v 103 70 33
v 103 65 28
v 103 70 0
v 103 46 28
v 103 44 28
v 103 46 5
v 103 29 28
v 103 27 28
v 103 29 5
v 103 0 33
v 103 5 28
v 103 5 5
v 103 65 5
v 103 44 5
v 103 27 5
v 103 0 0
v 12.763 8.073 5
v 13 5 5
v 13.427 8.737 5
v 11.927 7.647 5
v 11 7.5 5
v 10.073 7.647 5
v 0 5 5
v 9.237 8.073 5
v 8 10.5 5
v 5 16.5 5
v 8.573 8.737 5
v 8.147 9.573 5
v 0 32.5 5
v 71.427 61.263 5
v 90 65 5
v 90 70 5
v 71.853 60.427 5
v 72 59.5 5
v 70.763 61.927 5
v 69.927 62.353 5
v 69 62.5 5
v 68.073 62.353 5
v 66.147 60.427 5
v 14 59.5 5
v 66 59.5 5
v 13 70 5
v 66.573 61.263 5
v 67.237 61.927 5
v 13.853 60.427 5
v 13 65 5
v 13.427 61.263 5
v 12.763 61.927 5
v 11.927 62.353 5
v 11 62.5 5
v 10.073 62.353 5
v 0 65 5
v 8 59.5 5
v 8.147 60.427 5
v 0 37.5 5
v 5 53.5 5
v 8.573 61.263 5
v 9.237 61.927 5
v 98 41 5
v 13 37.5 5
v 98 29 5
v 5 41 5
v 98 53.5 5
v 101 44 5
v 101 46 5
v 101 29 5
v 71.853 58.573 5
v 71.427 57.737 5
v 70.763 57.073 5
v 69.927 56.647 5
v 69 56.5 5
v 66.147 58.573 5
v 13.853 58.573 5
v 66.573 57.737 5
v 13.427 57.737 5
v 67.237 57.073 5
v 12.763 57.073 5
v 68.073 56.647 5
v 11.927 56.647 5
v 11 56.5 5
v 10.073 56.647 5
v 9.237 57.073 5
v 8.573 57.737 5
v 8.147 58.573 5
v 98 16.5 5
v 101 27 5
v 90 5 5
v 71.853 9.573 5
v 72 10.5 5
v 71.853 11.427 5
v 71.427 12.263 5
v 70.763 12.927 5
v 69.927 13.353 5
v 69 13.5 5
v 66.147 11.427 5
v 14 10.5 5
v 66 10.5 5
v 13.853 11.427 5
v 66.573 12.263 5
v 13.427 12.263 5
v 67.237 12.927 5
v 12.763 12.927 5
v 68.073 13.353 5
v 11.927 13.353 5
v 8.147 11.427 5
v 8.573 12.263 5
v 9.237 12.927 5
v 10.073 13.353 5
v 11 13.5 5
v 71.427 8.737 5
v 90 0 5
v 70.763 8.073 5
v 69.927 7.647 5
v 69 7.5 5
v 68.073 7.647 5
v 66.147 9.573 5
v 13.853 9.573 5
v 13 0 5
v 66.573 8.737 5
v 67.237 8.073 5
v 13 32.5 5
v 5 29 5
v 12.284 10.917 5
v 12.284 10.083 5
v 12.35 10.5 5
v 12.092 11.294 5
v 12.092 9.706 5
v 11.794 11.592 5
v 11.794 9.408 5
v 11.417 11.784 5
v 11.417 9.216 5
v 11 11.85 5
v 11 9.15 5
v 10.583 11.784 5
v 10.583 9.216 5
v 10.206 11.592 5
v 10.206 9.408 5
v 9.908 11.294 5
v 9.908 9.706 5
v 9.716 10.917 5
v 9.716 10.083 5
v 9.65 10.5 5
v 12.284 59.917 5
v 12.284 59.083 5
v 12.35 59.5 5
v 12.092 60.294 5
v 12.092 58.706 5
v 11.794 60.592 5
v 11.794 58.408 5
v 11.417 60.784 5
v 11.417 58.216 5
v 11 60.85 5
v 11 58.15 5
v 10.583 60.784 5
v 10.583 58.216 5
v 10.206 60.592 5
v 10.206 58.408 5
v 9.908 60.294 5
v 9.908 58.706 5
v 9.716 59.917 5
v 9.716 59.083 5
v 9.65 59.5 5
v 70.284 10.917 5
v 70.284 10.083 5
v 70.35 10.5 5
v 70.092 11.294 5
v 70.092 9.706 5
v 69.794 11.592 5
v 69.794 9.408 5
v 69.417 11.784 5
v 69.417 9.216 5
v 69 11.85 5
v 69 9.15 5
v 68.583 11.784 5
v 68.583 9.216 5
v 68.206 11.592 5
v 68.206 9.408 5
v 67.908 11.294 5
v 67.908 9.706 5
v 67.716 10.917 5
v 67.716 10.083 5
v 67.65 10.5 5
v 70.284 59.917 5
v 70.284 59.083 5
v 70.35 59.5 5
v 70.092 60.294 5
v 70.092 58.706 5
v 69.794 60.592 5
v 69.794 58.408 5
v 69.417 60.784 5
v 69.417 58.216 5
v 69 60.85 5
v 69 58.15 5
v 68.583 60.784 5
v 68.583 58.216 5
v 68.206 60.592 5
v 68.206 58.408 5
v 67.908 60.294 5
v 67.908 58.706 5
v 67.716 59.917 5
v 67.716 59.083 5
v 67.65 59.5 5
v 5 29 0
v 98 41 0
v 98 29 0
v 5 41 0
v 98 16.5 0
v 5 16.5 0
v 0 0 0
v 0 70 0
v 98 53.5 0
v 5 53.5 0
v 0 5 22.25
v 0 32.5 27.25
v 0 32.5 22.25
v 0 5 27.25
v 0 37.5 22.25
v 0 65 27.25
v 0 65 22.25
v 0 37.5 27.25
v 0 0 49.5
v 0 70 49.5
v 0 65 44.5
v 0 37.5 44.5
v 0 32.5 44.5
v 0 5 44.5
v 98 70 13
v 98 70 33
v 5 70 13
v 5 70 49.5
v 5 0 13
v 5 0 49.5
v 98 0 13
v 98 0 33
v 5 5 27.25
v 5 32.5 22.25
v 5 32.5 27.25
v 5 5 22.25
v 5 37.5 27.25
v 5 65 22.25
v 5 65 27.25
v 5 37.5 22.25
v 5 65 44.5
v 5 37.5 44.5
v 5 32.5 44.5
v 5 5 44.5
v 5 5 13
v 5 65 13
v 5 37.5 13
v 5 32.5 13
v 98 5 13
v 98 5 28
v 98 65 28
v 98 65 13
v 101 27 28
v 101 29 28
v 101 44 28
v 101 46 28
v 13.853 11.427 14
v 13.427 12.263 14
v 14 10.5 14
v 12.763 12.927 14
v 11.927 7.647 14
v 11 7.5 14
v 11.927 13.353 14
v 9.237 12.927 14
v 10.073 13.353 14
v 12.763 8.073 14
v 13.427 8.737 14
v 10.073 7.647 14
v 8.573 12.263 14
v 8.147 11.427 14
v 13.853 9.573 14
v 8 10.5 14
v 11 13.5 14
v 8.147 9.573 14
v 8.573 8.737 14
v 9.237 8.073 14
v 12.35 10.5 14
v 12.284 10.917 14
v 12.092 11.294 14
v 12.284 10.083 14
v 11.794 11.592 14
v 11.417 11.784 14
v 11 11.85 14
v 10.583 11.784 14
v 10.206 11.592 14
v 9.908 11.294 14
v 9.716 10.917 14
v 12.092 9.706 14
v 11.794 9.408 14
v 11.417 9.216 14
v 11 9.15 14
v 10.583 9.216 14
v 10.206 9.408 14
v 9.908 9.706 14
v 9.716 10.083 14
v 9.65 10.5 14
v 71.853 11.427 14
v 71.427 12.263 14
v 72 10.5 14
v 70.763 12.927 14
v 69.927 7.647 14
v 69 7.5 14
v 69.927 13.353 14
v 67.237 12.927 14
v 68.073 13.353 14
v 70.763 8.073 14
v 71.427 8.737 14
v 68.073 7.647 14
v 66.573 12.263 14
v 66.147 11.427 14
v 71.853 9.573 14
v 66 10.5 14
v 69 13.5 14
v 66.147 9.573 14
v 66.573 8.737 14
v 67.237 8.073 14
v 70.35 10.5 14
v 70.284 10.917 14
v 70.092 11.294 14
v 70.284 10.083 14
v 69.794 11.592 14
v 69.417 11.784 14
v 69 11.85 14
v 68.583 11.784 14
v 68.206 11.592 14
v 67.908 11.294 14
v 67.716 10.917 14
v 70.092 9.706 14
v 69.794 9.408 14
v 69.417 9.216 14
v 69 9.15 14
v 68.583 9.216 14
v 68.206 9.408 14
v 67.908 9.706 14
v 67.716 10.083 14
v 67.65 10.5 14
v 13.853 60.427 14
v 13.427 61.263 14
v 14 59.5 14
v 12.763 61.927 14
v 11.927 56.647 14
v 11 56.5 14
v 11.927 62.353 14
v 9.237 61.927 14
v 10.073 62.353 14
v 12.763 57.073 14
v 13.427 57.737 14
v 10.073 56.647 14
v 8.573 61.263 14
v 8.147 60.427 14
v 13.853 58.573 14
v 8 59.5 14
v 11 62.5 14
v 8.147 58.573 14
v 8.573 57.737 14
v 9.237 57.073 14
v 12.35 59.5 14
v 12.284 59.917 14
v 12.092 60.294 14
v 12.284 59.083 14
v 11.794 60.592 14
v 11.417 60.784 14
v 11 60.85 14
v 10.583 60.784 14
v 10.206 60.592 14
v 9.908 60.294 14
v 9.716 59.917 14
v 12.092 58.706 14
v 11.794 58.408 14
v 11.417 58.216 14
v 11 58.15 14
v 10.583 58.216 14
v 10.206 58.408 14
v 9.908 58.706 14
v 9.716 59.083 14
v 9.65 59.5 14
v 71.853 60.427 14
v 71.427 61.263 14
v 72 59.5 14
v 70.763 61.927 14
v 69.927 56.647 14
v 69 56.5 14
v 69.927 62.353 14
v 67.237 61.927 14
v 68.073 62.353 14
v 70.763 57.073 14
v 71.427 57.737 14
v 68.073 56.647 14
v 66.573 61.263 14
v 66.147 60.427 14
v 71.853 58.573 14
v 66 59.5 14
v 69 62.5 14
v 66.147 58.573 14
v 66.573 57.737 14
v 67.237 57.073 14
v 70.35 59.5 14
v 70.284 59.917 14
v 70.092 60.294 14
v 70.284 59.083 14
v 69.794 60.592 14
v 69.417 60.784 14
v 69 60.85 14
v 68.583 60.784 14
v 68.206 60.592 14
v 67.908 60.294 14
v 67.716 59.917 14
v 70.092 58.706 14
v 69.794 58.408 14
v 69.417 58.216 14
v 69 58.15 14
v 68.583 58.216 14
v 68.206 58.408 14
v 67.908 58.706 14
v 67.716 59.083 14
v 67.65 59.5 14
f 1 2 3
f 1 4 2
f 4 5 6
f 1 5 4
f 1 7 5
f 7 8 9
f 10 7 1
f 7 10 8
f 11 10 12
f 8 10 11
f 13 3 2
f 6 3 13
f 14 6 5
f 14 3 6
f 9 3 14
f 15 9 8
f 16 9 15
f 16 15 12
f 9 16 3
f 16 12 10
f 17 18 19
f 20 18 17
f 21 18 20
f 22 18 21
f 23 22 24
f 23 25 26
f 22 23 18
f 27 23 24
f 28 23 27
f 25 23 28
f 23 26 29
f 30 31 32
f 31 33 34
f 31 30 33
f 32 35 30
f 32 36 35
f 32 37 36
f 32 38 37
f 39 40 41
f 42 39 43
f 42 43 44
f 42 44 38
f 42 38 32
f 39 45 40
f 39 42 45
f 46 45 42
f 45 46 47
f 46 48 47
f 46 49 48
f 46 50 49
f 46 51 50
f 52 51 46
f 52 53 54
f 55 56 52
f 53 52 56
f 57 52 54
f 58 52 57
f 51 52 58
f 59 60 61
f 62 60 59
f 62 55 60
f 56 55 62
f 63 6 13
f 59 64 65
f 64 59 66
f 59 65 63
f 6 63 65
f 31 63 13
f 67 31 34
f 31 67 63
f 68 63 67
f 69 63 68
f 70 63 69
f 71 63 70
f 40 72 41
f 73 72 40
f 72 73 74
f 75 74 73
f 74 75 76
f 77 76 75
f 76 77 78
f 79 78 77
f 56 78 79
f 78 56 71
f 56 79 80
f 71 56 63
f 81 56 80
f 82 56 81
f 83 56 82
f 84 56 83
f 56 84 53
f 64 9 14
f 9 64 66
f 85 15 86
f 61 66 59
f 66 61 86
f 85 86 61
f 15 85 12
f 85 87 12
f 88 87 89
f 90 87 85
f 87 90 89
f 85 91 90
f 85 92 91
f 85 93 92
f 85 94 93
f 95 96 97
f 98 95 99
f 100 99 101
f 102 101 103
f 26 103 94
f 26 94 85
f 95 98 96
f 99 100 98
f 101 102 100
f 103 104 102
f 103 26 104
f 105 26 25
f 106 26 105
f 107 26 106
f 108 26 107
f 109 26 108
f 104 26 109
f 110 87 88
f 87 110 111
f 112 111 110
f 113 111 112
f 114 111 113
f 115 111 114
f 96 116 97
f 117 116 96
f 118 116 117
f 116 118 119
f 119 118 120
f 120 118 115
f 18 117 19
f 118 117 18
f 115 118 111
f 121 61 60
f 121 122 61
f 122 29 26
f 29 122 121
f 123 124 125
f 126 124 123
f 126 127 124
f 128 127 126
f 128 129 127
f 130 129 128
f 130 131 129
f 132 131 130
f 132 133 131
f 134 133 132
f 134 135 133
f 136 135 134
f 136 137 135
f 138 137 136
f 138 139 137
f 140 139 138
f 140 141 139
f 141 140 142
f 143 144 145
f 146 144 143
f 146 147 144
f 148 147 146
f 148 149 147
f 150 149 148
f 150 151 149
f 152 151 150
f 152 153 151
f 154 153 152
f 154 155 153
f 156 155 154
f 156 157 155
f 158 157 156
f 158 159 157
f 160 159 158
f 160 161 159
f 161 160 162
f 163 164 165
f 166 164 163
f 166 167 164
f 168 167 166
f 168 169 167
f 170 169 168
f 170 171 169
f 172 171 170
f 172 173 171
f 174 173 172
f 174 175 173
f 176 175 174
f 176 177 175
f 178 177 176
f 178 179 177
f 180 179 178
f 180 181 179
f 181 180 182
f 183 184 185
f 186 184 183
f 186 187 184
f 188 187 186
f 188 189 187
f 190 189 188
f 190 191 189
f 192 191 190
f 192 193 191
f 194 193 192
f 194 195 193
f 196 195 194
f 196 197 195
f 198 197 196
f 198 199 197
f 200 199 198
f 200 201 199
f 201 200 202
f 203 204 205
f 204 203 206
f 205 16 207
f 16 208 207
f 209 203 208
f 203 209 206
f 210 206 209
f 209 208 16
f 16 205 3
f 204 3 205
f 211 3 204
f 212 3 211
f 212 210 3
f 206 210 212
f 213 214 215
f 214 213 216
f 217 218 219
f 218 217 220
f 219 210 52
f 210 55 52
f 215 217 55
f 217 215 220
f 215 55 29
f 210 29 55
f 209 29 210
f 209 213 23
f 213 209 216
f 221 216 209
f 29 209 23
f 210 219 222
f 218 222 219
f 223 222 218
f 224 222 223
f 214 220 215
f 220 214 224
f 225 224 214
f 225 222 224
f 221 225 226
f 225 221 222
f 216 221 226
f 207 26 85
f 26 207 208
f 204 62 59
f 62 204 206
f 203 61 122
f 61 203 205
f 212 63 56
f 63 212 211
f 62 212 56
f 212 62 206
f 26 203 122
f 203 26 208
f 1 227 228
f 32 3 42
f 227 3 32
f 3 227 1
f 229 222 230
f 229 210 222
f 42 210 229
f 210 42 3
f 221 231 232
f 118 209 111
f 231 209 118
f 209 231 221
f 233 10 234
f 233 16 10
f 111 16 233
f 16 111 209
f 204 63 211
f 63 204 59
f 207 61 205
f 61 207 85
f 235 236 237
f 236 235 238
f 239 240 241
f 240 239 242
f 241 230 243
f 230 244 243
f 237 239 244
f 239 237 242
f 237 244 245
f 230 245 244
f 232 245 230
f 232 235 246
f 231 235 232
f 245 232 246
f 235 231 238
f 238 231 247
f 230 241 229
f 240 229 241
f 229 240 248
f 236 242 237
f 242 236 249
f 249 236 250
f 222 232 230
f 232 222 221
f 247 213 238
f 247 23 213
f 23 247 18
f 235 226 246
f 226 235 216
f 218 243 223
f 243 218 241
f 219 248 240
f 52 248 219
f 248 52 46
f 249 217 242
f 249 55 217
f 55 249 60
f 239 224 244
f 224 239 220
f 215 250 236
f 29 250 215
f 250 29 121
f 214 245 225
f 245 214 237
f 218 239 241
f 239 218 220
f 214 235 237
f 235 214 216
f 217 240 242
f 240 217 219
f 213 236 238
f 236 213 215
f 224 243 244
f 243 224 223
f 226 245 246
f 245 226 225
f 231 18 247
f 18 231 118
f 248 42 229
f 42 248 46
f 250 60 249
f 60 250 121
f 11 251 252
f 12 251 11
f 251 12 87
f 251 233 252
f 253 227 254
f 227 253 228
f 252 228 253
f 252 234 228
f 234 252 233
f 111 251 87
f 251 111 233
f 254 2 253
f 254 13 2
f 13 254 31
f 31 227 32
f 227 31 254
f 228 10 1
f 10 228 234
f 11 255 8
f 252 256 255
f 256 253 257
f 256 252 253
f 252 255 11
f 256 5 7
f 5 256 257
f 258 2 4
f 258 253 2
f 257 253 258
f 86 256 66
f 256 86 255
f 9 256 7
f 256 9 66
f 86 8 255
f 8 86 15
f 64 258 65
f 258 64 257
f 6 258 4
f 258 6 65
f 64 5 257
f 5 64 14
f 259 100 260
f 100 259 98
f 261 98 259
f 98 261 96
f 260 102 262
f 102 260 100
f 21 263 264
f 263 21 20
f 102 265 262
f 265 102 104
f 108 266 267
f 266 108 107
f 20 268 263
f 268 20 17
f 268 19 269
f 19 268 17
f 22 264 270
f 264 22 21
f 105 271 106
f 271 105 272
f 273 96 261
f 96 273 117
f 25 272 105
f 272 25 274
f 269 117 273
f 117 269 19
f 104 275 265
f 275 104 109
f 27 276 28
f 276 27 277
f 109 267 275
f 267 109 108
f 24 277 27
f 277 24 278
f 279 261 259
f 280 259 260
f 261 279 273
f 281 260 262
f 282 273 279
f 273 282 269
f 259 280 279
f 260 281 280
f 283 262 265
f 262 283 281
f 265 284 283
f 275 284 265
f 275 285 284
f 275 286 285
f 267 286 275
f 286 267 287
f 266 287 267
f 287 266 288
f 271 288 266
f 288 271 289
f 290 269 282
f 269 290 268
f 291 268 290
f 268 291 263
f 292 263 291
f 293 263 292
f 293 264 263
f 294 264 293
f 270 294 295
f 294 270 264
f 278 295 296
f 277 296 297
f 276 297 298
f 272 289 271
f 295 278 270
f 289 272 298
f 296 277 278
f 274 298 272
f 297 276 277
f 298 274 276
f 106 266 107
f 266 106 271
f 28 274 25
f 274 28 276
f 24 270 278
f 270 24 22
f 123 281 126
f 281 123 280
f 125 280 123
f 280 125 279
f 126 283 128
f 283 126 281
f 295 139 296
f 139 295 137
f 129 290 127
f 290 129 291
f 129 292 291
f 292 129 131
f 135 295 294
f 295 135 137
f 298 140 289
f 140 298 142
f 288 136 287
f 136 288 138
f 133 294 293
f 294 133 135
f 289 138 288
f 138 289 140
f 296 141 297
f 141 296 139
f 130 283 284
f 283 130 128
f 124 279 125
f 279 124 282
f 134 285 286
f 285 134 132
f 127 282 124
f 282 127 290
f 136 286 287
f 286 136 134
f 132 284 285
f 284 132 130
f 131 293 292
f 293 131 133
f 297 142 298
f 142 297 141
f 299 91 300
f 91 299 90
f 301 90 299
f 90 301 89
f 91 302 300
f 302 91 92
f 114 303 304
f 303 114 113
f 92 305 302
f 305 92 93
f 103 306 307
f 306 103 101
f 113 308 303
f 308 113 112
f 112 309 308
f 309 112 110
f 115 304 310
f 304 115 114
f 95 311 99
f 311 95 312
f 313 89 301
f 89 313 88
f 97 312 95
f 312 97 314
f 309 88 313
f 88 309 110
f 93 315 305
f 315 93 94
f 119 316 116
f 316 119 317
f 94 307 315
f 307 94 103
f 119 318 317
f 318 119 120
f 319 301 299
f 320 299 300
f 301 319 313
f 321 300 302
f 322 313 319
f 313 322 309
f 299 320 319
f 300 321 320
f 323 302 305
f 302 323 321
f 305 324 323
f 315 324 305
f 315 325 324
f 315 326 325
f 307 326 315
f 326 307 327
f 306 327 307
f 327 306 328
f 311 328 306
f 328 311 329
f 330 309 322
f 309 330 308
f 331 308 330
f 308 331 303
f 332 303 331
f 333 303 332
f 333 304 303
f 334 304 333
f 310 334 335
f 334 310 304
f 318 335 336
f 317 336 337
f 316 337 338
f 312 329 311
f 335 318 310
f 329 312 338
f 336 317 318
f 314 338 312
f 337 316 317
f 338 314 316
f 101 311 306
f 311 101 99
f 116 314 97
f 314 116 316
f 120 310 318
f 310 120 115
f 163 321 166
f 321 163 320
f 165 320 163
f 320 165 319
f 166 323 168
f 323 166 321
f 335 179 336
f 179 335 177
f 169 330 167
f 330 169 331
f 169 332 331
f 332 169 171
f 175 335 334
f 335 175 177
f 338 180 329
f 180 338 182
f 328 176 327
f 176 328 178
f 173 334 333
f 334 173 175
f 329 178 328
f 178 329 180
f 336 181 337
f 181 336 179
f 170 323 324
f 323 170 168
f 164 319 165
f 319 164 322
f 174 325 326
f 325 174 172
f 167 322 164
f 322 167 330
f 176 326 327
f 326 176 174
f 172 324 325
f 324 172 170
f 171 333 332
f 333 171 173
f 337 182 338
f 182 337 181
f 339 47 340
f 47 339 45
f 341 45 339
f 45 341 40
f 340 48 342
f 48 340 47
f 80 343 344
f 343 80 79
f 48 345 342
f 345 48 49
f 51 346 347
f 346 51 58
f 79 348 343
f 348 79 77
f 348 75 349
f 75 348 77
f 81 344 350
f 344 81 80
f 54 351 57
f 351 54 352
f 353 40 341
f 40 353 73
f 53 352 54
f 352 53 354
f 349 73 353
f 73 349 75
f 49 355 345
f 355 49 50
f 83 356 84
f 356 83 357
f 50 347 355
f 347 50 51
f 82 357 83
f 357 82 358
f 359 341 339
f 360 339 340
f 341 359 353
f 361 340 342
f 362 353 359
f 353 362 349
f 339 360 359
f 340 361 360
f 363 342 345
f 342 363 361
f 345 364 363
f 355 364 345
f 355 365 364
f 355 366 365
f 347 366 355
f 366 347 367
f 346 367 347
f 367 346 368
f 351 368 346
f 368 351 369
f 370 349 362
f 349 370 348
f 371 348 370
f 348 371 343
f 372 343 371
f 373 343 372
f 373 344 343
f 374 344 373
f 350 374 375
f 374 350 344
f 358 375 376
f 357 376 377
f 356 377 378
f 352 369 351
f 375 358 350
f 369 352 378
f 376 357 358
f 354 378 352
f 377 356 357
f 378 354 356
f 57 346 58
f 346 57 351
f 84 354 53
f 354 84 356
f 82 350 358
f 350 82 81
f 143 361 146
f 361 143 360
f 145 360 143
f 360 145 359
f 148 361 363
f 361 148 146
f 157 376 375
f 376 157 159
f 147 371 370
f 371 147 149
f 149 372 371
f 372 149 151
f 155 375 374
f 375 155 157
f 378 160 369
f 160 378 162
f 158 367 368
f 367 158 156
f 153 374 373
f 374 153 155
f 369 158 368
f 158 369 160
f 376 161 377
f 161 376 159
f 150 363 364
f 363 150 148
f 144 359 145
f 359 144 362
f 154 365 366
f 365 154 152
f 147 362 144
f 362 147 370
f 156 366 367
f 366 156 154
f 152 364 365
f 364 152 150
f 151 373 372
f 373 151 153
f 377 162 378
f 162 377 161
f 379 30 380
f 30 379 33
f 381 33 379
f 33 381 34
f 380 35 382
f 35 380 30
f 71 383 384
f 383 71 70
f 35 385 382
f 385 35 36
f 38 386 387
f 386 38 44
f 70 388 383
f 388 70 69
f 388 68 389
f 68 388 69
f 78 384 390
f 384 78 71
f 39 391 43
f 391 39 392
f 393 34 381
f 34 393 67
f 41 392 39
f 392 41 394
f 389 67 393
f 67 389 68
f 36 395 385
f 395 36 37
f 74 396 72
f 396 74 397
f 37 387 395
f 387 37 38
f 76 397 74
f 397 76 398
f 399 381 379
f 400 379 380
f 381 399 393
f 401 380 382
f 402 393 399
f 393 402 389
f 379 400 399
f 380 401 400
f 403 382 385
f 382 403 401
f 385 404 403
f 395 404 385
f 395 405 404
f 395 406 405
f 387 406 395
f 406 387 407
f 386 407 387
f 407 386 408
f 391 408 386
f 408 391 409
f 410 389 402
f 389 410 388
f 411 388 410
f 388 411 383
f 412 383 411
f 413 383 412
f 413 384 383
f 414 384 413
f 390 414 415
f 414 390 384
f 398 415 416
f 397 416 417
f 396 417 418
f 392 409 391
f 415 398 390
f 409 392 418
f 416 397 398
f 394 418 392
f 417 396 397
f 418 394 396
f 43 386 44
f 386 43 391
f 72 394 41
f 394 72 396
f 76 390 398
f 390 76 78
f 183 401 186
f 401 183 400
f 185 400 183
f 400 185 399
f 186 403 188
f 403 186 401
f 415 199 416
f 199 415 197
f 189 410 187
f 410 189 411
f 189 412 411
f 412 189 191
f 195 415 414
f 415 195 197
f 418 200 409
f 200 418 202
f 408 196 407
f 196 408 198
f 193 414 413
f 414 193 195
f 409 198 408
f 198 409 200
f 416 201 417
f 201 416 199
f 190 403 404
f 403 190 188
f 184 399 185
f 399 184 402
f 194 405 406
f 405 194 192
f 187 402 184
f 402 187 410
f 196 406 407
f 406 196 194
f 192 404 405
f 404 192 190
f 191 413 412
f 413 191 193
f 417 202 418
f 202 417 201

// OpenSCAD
// Neato XV Signature Pro - Right Pod
// Mounts: Pi 5 + AI HAT+ 2 (pre-stacked)
// Location: right side of rear chassis (viewed from behind robot)
// One-piece print — flat on bed, no supports needed.
//
// ORIENTATION (as mounted on robot):
//   Bottom face = velcros to robot chassis
//   Pi long axis runs across chassis (X)
//   USB/ethernet ports face inward (toward center vent) = high X side
//   Non-USB edge faces outer (left) wall = low X side
//
// Outer (left) wall: 75% height, mid + top horizontal beams
// Inner (right/USB) wall: 50% height, stops at mid beam — port access

// ============================================================
// PARAMETERS
// ============================================================

pod_width  = 103;
pod_depth  = 70;
pod_height = 66;

rail_w = 5;
rib_w  = 12;

outer_wall_h = pod_height * 0.75;  // ~50mm
inner_wall_h = pod_height * 0.50;  // ~33mm — stops at mid beam

standoff_h    = 9;
standoff_od   = 6;
standoff_hole = 2.7; // M2.5

pi_hole_x_span = 58;
pi_hole_y_span = 49;

pi_x_left  = 11;
pi_x_right = pi_x_left + pi_hole_x_span;  // 69mm

pi_y_front = (pod_depth - pi_hole_y_span) / 2;  // 10.5mm
pi_y_rear  = pi_y_front + pi_hole_y_span;        // 59.5mm
pi_y_mid   = (pi_y_front + pi_y_rear) / 2;       // 35mm

rib_positions = [pi_y_front, pi_y_mid, pi_y_rear];

pi_holes = [
    [pi_x_left,  pi_y_front],
    [pi_x_right, pi_y_front],
    [pi_x_left,  pi_y_rear ],
    [pi_x_right, pi_y_rear ],
];

// Port-aware inner rail gap positions (measured from ruler)
port_post_nic_usb3  = 28;
port_post_usb3_usb2 = 45;
thin_post = 2;

// ============================================================
// MODULES
// ============================================================

module ribbed_bottom() {
    cube([rail_w, pod_depth, rail_w]);
    translate([pod_width - rail_w, 0, 0])
        cube([rail_w, pod_depth, rail_w]);
    cube([pod_width, rail_w, rail_w]);
    translate([0, pod_depth - rail_w, 0])
        cube([pod_width, rail_w, rail_w]);
    for (y_center = rib_positions) {
        translate([0, y_center - rib_w / 2, 0])
            cube([pod_width, rib_w, rail_w]);
    }
}

// Gusset: triangle in XZ plane, 3mm thick in Y
// X=0 at post inner face, Z=0 at base top, extends +X into pod and +Z up post
module gusset() {
    rotate([90, 0, 0])
        translate([0, 0, -5])
            linear_extrude(height=5)
                polygon([[0,0], [8,0], [0,8]]);
}

module outer_wall() {
    // Back post
    cube([rail_w, rail_w, outer_wall_h]);
    // Front post
    translate([0, pod_depth - rail_w, 0])
        cube([rail_w, rail_w, outer_wall_h]);
    // Center post
    translate([0, pod_depth/2 - rail_w/2, 0])
        cube([rail_w, rail_w, outer_wall_h]);
    // Mid horizontal
    translate([0, 0, outer_wall_h/2 - rail_w/2])
        cube([rail_w, pod_depth, rail_w]);
    // Top horizontal
    translate([0, 0, outer_wall_h - rail_w])
        cube([rail_w, pod_depth, rail_w]);
    // Gussets — back and front corner posts only
    // Back post: Y=1 to Y=4 (centered on 5mm post), extends into pod in X
    translate([rail_w, 0, rail_w])
        gusset();
    translate([rail_w, pod_depth, rail_w])
        mirror([0, 1, 0]) gusset();
    // Center post
    translate([rail_w, pod_depth/2 - rail_w/2, rail_w])
        gusset();
}

module inner_wall() {
    // Back corner post (NIC side)
    cube([rail_w, rail_w, inner_wall_h]);
    // Gussets — back and front corner posts, extending toward outer wall (-X)
    translate([pod_width - rail_w, 0, rail_w])
        mirror([1, 0, 0]) gusset();
    translate([pod_width - rail_w, pod_depth, rail_w])
        mirror([1, 0, 0]) mirror([0, 1, 0]) gusset();
    // Front corner post (USB side)
    translate([pod_width - rail_w, pod_depth - rail_w, 0])
        cube([rail_w, rail_w, inner_wall_h]);
    // Thin inter-port posts up to mid beam
    translate([pod_width - thin_post, port_post_nic_usb3 - thin_post/2, 0])
        cube([thin_post, thin_post, inner_wall_h - rail_w]);
    translate([pod_width - thin_post, port_post_usb3_usb2 - thin_post/2, 0])
        cube([thin_post, thin_post, inner_wall_h - rail_w]);
    // Back corner post
    translate([pod_width - rail_w, 0, 0])
        cube([rail_w, rail_w, inner_wall_h]);
    // Mid/top horizontal beam (single beam at top of inner wall)
    translate([pod_width - rail_w, 0, inner_wall_h - rail_w])
        cube([rail_w, pod_depth, rail_w]);
}

module standoff(h, hole_d) {
    difference() {
        cylinder(h=h, d=standoff_od, $fn=20);
        cylinder(h=h + 0.1, d=hole_d, $fn=20);
    }
}

// ============================================================
// MAIN
// ============================================================

module right_pod() {
    union() {
        ribbed_bottom();
        outer_wall();
        inner_wall();

        for (h = pi_holes) {
            translate([h[0], h[1], rail_w])
                standoff(standoff_h, standoff_hole);
        }
    }
}

right_pod();
